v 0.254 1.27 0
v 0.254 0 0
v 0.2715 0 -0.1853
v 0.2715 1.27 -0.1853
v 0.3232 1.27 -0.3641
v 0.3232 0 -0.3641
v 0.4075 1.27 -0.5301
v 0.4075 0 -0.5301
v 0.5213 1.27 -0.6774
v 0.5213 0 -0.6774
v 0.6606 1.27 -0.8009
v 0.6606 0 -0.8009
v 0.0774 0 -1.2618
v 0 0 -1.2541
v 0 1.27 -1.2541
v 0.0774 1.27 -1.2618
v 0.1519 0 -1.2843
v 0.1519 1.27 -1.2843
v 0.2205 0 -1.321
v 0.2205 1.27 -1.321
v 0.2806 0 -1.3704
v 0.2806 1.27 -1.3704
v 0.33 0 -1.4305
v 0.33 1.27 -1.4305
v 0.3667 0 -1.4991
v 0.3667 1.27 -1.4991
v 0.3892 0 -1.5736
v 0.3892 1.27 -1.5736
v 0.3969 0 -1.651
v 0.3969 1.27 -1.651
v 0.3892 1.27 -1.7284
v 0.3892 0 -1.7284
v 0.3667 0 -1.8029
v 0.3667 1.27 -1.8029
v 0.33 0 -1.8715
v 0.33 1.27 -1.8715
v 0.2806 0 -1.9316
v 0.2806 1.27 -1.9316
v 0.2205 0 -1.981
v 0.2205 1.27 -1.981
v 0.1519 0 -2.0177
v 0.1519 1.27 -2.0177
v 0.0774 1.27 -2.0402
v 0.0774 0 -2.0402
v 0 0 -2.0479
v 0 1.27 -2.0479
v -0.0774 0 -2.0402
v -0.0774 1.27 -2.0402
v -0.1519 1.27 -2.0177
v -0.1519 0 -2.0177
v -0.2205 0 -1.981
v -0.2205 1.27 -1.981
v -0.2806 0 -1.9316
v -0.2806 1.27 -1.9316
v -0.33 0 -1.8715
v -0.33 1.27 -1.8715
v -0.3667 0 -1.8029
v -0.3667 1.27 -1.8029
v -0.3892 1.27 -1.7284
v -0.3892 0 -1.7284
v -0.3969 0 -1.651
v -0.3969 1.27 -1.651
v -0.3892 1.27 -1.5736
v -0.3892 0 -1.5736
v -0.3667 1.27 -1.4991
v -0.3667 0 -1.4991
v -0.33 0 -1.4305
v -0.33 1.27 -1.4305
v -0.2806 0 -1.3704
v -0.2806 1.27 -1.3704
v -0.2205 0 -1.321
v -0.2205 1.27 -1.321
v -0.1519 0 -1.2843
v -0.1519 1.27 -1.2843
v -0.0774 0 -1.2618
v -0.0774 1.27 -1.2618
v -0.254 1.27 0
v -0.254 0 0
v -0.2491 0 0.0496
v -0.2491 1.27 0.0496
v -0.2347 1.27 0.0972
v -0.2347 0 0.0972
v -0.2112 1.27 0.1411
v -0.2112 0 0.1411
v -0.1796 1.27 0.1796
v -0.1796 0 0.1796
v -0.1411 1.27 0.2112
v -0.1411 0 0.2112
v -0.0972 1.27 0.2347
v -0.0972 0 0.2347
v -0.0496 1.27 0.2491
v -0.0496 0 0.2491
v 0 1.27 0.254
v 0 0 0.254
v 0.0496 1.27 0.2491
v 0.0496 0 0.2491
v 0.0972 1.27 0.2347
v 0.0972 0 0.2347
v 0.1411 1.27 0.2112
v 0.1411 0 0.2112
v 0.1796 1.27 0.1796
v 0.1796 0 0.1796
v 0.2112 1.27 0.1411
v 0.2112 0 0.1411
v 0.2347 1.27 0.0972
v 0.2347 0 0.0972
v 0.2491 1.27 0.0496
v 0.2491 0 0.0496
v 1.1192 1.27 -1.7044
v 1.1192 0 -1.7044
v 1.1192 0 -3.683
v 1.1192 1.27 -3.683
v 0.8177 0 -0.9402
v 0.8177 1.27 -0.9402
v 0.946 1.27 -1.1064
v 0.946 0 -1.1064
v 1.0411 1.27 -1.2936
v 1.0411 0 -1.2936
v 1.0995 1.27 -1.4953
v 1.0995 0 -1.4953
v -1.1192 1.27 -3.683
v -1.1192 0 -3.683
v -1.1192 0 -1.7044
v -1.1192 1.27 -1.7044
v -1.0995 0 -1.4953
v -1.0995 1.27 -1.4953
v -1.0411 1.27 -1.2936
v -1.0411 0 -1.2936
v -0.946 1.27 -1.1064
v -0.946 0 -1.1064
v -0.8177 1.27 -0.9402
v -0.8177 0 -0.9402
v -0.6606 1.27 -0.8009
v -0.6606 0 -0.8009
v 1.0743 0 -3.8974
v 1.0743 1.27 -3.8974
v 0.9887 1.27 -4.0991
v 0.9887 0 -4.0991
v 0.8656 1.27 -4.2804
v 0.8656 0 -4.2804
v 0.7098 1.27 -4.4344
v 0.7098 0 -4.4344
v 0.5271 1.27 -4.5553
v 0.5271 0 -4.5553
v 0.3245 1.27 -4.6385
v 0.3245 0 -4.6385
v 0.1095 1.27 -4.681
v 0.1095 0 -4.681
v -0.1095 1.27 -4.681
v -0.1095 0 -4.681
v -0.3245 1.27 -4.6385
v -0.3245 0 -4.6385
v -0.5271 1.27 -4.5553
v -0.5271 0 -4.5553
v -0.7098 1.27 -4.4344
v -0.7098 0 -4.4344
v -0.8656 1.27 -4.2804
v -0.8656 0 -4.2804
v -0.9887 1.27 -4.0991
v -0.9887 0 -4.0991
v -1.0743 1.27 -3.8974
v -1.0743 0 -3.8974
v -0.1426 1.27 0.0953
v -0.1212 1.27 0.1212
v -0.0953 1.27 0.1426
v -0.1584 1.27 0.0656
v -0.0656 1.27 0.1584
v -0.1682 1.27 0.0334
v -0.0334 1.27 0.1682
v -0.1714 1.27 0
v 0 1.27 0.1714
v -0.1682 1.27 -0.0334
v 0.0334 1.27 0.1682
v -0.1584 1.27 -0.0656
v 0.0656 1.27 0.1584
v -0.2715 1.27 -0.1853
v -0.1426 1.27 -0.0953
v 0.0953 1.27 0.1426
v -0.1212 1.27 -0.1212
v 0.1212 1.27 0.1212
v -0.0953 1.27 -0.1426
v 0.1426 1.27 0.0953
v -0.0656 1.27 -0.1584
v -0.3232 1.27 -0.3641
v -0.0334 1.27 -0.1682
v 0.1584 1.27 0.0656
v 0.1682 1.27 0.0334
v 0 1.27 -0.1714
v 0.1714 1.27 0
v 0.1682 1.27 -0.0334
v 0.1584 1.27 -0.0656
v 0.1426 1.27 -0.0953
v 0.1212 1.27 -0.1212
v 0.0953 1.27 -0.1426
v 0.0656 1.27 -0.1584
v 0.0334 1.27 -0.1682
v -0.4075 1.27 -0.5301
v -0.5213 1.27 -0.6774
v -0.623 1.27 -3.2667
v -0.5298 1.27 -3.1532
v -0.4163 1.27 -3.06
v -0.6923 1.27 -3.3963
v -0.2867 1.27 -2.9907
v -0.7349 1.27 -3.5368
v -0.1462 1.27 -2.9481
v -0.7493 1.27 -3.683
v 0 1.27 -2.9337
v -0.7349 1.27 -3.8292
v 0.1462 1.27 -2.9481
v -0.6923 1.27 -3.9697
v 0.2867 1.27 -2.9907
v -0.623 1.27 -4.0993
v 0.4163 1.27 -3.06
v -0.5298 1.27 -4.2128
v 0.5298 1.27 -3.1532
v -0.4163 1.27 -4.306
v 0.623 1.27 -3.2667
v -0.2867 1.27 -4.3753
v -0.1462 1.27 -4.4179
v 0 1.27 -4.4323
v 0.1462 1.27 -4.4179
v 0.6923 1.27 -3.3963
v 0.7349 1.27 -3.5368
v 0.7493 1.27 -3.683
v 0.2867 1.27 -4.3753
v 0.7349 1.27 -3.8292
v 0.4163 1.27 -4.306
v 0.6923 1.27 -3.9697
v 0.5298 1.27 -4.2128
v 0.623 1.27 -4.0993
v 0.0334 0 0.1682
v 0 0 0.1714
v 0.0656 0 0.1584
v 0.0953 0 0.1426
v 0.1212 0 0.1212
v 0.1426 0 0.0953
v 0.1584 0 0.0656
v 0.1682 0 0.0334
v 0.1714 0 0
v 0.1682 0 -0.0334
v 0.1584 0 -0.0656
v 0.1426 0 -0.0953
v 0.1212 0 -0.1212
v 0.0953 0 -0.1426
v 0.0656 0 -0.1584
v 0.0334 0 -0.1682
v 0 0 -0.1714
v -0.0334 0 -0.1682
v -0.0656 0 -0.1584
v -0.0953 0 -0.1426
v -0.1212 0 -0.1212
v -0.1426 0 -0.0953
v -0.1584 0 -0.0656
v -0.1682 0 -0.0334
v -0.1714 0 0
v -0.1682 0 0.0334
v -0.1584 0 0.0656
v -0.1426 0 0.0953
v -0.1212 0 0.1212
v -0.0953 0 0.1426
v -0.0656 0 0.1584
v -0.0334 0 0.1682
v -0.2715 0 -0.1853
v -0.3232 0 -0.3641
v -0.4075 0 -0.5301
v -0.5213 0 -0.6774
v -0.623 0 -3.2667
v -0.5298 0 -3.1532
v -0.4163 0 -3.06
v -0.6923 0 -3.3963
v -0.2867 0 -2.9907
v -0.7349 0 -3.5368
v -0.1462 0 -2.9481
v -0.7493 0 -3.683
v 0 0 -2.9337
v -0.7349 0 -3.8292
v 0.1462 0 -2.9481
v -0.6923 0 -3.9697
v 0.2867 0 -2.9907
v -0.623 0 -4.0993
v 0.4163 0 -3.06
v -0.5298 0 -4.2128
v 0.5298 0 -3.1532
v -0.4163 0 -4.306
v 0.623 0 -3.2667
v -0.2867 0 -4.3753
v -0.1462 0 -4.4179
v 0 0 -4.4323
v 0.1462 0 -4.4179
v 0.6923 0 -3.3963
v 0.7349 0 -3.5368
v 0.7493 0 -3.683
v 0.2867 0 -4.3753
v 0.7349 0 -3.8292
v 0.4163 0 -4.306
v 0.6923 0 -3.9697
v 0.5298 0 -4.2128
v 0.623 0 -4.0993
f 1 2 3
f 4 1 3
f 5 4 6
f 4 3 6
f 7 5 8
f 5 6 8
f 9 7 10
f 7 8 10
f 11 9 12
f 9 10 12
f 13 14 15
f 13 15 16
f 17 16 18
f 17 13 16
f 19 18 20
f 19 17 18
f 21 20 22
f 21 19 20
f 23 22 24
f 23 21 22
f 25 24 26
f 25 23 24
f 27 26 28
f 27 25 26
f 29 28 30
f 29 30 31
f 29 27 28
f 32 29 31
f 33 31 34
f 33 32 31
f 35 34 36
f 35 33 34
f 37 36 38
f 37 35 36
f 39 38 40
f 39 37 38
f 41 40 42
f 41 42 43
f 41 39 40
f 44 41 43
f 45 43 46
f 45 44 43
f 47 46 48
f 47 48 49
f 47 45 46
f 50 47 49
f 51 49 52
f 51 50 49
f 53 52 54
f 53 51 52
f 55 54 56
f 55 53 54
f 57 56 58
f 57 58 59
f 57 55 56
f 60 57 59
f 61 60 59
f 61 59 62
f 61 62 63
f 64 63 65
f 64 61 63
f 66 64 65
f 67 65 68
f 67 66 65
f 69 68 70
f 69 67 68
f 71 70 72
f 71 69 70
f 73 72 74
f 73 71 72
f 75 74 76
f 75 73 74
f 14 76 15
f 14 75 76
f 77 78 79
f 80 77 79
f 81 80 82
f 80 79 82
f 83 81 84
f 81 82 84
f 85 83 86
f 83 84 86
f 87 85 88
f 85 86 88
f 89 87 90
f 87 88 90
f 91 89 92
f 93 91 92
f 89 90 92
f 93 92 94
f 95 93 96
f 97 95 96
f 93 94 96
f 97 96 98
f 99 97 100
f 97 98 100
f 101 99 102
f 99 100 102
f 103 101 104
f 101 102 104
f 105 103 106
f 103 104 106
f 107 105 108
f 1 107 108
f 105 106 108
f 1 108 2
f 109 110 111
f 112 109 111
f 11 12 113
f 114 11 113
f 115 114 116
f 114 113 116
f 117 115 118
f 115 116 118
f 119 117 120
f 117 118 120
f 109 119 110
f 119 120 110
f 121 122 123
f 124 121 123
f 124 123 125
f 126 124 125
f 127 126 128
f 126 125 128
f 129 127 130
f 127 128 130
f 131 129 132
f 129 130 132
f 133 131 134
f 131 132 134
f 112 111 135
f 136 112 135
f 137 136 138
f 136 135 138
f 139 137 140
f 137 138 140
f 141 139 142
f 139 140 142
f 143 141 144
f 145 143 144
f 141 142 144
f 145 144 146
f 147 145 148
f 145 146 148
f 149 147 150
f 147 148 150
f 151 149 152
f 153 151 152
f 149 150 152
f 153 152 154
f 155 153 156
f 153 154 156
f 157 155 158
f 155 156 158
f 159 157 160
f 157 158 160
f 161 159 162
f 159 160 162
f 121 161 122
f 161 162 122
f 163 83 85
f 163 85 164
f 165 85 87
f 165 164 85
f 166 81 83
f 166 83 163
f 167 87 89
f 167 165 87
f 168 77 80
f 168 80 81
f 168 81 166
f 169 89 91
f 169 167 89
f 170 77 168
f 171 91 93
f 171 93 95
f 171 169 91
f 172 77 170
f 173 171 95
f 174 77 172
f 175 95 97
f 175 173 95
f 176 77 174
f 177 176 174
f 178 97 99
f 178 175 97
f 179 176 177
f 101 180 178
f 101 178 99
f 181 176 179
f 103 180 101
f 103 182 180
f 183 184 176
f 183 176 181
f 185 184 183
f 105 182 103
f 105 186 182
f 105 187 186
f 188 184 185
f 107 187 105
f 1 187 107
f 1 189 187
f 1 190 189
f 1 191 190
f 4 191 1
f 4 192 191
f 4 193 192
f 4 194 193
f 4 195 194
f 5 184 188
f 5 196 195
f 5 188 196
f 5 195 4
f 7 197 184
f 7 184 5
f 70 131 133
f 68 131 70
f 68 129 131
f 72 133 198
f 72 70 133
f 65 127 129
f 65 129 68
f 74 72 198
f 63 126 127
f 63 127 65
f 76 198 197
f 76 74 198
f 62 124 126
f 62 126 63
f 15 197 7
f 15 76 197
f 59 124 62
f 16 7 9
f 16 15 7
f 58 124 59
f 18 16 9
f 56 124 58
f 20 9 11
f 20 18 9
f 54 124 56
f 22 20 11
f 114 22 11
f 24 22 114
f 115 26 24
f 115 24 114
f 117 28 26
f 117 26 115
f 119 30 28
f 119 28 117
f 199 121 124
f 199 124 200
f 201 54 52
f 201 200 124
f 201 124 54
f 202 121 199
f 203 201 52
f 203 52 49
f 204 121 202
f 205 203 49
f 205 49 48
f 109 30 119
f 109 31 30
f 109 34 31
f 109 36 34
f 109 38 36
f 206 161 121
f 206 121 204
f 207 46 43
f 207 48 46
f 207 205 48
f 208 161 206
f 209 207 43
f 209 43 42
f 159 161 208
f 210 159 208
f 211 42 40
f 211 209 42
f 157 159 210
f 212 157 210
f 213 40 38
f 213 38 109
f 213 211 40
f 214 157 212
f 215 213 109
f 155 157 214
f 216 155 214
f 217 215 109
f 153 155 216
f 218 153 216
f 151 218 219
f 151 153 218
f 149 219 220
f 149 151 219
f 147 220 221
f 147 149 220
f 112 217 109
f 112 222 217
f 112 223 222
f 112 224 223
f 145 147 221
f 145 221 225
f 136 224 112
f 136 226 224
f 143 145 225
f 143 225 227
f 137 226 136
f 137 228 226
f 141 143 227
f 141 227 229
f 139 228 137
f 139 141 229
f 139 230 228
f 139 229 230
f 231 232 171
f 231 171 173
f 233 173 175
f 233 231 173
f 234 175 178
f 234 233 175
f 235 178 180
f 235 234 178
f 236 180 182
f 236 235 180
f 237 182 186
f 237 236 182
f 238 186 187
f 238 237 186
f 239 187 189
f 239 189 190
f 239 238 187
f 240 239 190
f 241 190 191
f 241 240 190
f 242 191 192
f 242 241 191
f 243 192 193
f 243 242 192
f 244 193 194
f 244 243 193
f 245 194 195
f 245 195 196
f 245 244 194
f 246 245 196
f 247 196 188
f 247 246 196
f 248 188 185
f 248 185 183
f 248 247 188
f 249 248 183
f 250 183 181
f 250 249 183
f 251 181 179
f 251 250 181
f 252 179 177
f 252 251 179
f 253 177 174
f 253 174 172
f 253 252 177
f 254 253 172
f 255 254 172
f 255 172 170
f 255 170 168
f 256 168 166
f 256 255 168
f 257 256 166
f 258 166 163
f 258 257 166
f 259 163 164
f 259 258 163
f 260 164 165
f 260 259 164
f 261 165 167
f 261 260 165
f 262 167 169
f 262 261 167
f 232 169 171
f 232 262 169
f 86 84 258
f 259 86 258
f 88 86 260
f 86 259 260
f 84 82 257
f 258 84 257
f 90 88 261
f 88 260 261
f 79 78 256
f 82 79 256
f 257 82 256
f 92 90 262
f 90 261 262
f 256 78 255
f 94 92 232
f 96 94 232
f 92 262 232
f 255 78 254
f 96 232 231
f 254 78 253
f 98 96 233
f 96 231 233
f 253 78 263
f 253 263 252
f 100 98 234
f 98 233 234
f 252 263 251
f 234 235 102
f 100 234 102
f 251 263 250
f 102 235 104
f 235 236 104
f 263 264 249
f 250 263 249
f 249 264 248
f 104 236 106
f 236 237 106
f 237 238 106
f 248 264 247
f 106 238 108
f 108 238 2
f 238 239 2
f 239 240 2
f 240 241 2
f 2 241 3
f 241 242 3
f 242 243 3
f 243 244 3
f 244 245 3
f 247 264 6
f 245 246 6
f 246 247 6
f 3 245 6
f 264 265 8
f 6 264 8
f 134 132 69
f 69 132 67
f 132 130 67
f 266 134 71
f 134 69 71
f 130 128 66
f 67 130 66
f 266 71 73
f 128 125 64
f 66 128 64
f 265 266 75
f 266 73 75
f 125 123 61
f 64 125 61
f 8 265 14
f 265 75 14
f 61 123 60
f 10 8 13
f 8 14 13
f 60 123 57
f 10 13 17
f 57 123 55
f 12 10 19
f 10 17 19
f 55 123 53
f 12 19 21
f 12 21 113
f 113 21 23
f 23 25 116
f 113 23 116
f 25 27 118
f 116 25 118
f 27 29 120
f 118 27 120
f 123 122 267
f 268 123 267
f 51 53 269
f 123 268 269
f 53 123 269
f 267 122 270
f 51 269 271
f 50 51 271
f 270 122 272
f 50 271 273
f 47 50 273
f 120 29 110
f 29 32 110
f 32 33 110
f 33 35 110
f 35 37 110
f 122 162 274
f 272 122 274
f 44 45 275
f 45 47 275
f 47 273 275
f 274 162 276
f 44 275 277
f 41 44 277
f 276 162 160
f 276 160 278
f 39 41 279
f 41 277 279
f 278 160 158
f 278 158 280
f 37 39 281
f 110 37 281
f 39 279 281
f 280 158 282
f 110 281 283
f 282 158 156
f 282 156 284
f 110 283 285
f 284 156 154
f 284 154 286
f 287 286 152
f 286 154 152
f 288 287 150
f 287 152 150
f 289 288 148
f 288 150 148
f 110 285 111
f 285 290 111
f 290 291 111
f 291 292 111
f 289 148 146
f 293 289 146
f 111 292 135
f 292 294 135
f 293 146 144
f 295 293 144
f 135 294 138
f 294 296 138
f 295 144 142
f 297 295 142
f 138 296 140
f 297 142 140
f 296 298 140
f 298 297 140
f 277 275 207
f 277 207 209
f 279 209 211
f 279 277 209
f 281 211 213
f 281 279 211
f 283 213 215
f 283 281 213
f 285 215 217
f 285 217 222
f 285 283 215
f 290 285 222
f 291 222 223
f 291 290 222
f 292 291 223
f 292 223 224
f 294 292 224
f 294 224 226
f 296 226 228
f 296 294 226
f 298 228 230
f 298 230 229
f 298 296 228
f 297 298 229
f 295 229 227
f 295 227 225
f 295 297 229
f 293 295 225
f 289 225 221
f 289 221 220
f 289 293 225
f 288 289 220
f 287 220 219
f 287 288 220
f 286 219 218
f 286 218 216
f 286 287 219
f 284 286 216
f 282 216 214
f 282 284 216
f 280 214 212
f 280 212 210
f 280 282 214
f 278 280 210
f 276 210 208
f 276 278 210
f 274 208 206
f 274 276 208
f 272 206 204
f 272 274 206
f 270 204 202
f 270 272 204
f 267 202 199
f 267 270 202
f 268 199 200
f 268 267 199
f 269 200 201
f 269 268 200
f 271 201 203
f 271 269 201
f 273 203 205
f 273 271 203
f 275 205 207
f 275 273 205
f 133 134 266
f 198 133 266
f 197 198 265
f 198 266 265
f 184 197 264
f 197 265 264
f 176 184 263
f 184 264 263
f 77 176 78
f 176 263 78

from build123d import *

# Parameters (mm, degrees)
SKETCH1_R           = 0.396875
SKETCH1_R_2         = 0.7493
SKETCH1_R_3         = 0.254
SKETCH1_R_4         = 0.17145
BOSS_EXTRUDE1_DEPTH = 1.27


with BuildPart() as part:
    # Sketch1 → Boss-Extrude1 (new body)
    # profile 1 of 2: a face of its own
    with BuildSketch(Plane(origin=(0, 0, 0), x_dir=(1, 0, 0), z_dir=(0, 1, 0))):
        with BuildLine():
            ThreePointArc((1.1191875, 3.683), (0, 4.6863), (-1.1191875, 3.683))
            Line((-1.1191875, 3.683), (-1.1191875, 1.70438291))
            ThreePointArc((-1.1191875, 1.70438291), (-0.997969385, 1.197788628), (-0.660573073, 0.800931819))
            ThreePointArc((-0.660573073, 0.800931819), (-0.361462868, 0.449108406), (-0.254, 0))
            ThreePointArc((-0.254, 0), (0, 0.254), (0.254, 0))
            ThreePointArc((0.254, 0), (0.361462868, 0.449108406), (0.660573073, 0.800931819))
            ThreePointArc((0.660573073, 0.800931819), (0.997969385, 1.197788628), (1.1191875, 1.70438291))
            Line((1.1191875, 1.70438291), (1.1191875, 3.683))
        make_face()
        with Locations(Location((0, 1.651, 0), (0, 0, 270))):
            Circle(SKETCH1_R, mode=Mode.SUBTRACT)
        with Locations(Location((0, 3.683, 0), (0, 0, 270))):
            Circle(SKETCH1_R_2, mode=Mode.SUBTRACT)
    # profile 2 of 2: a face of its own
    with BuildSketch(Plane(origin=(0, 0, 0), x_dir=(1, 0, 0), z_dir=(0, 1, 0))):
        Circle(SKETCH1_R_3)
        with Locations(Location((0, 0, 0), (0, 0, 270))):
            Circle(SKETCH1_R_4, mode=Mode.SUBTRACT)
    extrude(amount=BOSS_EXTRUDE1_DEPTH)


solid = part.part
